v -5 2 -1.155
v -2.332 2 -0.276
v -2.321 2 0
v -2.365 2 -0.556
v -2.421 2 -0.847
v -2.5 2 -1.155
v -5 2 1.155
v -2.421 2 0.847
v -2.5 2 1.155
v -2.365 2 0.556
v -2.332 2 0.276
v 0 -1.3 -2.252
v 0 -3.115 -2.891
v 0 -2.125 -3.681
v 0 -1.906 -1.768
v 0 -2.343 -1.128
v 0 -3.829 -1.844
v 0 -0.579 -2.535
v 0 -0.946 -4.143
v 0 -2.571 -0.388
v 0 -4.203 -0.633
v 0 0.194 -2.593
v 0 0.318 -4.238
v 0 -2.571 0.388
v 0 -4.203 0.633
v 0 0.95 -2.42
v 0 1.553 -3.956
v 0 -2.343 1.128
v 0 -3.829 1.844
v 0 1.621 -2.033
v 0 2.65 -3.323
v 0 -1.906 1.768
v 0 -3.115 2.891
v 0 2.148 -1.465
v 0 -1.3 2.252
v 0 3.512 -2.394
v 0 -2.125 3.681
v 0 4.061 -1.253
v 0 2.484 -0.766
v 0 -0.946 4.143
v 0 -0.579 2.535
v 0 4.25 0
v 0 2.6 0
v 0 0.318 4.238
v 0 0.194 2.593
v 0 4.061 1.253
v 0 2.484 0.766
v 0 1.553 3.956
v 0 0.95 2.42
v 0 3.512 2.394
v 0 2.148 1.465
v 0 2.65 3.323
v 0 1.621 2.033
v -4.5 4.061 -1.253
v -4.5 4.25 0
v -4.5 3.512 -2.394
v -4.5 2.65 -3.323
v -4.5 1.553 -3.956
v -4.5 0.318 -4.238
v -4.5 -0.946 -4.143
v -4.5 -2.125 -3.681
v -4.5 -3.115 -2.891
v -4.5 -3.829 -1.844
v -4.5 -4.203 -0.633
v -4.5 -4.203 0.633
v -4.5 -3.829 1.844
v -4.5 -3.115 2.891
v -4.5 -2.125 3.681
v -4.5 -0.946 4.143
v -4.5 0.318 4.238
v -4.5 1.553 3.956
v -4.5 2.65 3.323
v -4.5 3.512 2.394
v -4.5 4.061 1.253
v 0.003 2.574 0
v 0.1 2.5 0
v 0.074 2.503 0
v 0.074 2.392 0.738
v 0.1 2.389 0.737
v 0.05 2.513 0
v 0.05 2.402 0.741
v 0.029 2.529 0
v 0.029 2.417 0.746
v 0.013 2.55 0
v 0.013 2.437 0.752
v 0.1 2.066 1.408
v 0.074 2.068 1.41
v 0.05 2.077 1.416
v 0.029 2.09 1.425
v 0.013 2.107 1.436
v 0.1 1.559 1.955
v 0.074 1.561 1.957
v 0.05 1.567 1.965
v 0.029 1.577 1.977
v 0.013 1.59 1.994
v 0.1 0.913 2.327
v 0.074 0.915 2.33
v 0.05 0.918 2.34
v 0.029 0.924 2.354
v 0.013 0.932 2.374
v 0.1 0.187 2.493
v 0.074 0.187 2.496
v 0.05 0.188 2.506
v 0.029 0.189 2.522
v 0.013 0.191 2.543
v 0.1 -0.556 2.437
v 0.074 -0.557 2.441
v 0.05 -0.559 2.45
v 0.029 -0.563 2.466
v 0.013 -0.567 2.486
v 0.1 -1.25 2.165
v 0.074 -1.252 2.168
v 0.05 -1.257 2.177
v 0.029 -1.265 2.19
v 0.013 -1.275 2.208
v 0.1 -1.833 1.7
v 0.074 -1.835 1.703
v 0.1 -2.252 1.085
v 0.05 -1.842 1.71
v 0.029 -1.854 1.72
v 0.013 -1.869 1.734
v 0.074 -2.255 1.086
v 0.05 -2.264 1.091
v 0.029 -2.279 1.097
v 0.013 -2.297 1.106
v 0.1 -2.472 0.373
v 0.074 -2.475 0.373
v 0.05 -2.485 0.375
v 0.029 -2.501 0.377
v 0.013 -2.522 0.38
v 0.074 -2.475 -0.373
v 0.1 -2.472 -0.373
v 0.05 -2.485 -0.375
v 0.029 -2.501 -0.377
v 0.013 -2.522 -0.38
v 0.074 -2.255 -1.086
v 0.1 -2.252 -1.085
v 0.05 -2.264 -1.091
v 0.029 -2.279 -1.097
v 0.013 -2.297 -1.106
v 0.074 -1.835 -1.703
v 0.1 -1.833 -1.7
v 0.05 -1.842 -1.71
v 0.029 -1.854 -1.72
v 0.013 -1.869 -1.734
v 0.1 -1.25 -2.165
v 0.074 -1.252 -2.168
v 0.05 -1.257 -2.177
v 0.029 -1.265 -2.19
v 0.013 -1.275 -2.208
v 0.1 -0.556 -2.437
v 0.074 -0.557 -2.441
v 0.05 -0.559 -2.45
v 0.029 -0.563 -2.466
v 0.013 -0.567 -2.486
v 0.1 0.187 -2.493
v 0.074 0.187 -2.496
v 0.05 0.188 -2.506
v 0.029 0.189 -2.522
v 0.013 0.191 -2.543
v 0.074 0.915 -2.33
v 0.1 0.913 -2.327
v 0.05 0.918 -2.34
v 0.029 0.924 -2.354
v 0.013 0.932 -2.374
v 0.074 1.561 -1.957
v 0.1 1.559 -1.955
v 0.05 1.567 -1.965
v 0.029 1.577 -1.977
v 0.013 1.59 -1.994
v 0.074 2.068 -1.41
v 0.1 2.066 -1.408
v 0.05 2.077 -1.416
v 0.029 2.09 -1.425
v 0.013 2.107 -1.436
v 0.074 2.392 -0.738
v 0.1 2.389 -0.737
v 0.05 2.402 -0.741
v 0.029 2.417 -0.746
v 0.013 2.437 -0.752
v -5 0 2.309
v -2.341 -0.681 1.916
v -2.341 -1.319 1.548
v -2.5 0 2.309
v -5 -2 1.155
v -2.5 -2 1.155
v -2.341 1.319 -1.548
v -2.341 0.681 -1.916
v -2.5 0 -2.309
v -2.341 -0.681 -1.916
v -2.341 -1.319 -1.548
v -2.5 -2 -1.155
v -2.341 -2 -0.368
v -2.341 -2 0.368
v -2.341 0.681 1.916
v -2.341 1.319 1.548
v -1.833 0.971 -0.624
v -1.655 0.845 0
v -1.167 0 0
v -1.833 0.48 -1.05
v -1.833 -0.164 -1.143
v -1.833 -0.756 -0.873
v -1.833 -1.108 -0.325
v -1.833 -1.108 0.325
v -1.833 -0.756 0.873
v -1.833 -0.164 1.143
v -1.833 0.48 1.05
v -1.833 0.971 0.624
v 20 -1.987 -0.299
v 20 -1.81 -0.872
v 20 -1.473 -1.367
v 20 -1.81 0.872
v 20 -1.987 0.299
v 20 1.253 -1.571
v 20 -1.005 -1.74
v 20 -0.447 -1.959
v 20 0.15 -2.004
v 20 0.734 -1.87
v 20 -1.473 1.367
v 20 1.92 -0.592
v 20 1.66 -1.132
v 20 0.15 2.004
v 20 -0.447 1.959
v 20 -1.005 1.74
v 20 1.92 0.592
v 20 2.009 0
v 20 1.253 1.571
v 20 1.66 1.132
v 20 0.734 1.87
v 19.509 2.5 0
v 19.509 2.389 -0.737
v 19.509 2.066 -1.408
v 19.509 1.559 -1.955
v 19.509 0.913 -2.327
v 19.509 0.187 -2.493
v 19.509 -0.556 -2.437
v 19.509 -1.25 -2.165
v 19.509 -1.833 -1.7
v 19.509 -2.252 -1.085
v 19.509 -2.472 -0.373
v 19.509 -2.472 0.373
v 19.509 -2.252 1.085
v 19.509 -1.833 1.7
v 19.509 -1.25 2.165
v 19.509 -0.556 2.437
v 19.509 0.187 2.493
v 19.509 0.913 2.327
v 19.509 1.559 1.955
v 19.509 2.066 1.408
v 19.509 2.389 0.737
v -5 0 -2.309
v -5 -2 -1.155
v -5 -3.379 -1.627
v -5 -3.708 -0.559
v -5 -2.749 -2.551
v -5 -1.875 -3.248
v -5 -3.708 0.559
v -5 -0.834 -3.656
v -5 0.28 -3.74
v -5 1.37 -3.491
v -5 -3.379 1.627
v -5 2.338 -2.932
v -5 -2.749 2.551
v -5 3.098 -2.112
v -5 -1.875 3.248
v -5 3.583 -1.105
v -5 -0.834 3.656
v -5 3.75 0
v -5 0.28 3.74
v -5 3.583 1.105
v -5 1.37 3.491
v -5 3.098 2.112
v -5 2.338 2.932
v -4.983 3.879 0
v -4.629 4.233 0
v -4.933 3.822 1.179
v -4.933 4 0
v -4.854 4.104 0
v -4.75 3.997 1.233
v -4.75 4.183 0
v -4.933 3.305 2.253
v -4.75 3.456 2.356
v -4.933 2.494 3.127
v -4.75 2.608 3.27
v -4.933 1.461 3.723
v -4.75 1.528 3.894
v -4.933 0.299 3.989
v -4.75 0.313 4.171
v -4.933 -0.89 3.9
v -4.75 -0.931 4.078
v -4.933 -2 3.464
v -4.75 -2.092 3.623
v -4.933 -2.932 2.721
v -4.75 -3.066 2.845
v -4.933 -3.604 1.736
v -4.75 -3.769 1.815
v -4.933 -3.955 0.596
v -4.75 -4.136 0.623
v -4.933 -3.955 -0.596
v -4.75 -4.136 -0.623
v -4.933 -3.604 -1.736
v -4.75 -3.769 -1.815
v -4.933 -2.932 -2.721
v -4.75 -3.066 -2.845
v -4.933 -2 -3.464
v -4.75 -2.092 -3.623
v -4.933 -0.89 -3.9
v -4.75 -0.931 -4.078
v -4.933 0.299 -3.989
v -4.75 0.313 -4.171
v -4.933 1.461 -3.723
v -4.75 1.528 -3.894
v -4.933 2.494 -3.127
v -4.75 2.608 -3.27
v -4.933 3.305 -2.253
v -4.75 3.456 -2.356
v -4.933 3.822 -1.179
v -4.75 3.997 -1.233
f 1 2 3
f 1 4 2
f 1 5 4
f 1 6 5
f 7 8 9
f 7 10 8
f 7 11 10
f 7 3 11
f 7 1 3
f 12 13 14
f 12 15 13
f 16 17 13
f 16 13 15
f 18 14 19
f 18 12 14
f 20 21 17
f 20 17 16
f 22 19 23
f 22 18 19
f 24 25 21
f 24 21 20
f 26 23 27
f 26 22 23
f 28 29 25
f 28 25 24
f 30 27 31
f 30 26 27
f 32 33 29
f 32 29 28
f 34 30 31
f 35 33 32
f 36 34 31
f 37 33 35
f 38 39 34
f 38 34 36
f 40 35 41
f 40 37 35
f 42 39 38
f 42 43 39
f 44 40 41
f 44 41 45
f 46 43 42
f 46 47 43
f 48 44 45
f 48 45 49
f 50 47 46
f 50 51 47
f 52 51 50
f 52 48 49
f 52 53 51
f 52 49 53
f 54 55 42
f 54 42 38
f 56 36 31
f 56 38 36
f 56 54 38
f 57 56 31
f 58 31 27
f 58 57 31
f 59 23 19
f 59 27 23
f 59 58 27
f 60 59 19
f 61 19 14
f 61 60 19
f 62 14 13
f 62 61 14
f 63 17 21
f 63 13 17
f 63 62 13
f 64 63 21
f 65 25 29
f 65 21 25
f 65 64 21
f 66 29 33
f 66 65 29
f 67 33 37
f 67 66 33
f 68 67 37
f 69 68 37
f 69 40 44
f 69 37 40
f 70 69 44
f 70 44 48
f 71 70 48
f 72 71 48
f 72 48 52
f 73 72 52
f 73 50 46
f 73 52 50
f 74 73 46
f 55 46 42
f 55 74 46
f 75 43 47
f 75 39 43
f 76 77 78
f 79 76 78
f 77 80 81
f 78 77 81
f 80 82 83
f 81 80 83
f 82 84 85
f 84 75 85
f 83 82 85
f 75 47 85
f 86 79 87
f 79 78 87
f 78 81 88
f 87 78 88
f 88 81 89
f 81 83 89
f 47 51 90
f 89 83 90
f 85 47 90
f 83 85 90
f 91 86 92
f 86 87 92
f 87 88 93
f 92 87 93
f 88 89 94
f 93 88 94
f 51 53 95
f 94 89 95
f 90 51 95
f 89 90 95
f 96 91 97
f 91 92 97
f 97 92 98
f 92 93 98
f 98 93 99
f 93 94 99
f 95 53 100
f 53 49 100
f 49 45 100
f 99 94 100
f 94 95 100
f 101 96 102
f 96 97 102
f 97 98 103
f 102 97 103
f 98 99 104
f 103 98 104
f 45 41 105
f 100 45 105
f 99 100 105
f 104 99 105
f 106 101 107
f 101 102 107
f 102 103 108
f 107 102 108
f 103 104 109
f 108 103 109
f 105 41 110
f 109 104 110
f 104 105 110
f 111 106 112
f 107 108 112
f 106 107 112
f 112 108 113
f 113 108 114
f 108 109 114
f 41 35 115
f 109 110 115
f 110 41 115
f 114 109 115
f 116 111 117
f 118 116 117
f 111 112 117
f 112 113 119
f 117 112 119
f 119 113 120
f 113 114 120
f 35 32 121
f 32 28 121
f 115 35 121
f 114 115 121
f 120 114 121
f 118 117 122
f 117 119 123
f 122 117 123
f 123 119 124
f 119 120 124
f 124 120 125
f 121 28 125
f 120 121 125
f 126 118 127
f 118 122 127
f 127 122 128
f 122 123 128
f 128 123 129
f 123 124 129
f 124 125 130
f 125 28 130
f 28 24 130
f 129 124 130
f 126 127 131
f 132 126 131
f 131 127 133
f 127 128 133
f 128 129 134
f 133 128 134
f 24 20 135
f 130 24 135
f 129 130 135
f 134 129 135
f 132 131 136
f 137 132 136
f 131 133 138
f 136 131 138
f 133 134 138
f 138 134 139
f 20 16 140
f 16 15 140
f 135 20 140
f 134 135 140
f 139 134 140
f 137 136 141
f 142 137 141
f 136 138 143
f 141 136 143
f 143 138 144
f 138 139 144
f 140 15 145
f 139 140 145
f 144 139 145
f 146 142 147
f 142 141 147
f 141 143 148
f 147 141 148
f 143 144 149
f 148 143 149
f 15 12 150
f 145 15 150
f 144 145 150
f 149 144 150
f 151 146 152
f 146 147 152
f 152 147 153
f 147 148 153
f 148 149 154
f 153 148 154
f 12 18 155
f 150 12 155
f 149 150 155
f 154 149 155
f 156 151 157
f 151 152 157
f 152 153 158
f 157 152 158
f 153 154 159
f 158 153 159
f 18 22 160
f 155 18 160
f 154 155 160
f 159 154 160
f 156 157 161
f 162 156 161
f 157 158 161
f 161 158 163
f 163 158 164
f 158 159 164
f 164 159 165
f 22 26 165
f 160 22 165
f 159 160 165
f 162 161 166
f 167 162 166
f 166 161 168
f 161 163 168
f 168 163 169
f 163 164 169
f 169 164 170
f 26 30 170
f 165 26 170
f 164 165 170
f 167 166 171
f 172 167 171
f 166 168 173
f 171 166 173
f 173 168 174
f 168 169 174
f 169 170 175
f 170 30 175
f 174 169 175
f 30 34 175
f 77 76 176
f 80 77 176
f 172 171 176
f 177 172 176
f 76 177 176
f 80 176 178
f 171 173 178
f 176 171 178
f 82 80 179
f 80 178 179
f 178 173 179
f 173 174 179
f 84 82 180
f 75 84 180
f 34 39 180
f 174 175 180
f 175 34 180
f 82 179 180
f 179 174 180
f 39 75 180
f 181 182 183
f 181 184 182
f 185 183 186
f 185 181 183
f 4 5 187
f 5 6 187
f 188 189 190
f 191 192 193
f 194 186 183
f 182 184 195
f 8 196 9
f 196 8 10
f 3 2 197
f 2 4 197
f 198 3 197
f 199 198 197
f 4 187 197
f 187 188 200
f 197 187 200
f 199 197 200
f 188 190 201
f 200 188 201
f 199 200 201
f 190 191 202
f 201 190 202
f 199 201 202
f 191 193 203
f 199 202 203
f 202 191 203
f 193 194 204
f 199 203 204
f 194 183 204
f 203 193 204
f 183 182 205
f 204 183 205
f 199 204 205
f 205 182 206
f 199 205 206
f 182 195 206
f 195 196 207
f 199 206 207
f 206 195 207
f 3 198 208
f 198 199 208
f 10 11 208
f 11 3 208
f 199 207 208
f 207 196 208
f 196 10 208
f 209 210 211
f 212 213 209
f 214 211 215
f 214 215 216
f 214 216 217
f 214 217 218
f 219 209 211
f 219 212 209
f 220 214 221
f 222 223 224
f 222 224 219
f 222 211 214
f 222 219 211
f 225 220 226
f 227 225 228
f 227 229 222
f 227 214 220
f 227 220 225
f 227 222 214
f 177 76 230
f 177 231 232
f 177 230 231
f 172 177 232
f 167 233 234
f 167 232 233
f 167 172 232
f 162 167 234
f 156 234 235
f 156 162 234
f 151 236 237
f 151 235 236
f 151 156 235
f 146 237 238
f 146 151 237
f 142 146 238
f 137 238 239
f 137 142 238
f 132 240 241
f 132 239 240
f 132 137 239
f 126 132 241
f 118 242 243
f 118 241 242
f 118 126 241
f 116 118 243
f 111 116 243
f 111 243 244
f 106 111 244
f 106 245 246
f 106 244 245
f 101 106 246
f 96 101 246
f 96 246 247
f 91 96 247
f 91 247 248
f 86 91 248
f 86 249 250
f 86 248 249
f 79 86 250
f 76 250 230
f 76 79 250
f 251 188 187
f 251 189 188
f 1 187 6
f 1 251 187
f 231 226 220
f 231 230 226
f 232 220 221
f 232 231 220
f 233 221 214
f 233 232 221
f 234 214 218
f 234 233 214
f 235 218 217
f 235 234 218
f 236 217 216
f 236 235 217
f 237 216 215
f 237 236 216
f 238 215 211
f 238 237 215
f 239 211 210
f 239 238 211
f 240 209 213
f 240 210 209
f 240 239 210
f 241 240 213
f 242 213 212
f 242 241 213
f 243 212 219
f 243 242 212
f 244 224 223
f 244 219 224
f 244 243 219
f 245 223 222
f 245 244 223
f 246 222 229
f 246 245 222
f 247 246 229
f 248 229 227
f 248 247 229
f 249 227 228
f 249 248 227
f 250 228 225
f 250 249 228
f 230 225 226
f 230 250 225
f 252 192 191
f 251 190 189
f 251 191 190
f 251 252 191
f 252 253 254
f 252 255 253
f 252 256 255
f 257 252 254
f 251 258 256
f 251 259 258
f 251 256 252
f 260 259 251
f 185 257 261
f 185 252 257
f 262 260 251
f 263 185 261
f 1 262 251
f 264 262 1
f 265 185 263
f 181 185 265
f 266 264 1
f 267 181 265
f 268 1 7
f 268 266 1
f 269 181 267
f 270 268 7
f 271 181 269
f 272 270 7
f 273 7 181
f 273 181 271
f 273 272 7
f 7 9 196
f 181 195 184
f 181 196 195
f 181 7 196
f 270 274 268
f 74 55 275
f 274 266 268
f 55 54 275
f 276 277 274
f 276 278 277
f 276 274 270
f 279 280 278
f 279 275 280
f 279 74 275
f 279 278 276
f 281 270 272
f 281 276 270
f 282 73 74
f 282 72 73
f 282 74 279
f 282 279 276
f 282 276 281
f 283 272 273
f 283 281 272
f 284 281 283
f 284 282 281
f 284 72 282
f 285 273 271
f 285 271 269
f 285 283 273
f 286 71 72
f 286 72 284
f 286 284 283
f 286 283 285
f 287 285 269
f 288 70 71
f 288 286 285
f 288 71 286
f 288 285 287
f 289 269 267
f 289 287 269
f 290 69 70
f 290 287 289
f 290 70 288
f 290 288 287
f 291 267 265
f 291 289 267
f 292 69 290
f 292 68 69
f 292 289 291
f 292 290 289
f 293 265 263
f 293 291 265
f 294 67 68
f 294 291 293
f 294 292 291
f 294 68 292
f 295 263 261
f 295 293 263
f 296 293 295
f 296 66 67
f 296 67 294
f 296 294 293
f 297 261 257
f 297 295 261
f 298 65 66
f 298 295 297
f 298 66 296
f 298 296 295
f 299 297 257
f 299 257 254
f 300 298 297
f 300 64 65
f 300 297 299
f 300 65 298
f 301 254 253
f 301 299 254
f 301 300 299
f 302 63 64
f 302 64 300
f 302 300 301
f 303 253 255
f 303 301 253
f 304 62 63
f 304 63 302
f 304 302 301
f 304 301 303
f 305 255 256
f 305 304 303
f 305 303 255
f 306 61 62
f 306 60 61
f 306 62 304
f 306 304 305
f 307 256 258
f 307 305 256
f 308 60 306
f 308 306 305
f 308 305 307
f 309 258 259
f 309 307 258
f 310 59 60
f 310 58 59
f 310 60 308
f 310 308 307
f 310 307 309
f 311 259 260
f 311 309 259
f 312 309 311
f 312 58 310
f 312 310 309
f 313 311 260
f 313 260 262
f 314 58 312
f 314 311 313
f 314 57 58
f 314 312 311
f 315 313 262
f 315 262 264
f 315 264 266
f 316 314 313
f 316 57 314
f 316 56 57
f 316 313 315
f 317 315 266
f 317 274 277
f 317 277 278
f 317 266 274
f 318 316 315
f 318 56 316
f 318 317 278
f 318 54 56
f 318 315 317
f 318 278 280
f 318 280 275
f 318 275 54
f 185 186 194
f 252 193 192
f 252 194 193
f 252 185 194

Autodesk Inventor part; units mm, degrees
ref_plane "YZ Plane" through (0, 0, 0) normal (1, 0, 0) x (0, 1, 0)
ref_plane "XZ Plane" through (0, 0, 0) normal (0, 1, 0) x (-1, 0, 0)
sketch "Szkic1" plane through (0, 0, 0) normal (0, 0, 1) x (1, 0, 0)
  line L0 (-1.1667, 0) -> (20, 0)
  line L1 (20, 0) -> (20, 2.5)
  line L2 (20, 2.5) -> (4, 2.5)
  line L3 (4, 2.5) -> (3.5091, 2.5)
  line L4 (3.5091, 2.5) -> (0, 2.5)
  line L5 (0, 2.5) -> (0, 4.25)
  line L6 (0, 4.25) -> (-5, 4.25)
  line L7 (-5, 4.25) -> (-5, 2.3094)
  line L8 (-5, 2.3094) -> (-2.5, 2.3094)
  line L9 (-2.5, 2.3094) -> (-1.1667, 0)
  line L10 (-10, 0) -> (25, 0) projected
  line L11 (0, -0.85) -> (0, 5.1) projected
  line L12 (4, 2.5) -> (0, 2.5) construction
  dimension "d1" = 16
  dimension "d2" = 0.4909
  dimension "d3" = 5
  dimension "d4" = 2.5
  dimension "d5" = 60
  dimension "d6" = 5
  dimension "d7" = 5
  dimension "d8" = 4.6188
  dimension "d9" = 8.5
  dimension "d26" = 20
revolve "Bryła" add sketch "Szkic1" angle 360 about axis through (-1.1667, 0, 0) along (1, 0, 0)
sketch "Szkic2" plane through (-5, 0, 0) normal (-1, 0, 0) x (0, 0, 1)
  circle A0 centre (0, 0) radius 2.3094 projected
  line L0 (0, -5.95) -> (0, 5.95) projected
  line L1 (-5.95, 0) -> (5.95, 0) projected
  line L2 (2.3094, 0) -> (1.1547, -2)
  line L3 (1.1547, -2) -> (-1.1547, -2)
  line L4 (-1.1547, -2) -> (-2.3094, 0)
  line L5 (-2.3094, 0) -> (-1.1547, 2)
  line L6 (-1.1547, 2) -> (1.1547, 2)
  line L7 (1.1547, 2) -> (2.3094, 0)
extrude "Szczelina" add sketch "Szkic2" against normal up to next contours L7 A0 | A0 L2 | L6 L0 A0 | A0 L0 L3 | L0 L6 A0 | A0 L3 L0 | L4 A0 | A0 L5
fillet "Zaokrąglenie1" radius 0.5 1 edges at (-5, -4.25, 0)
thread "Gwint" size "M5x0.8" class "6g" standard "ISO Metric profile" length 16
chamfer "Faza1" distance 0.4908 distance2 0.4908 1 edges at (20, -2.5, 0) measured on face at (20, -0.7379, -0.3873)
ref_plane "Work Plane1" through (29, 0, 0) normal (0, -1, 0) x (1, 0, 0)
fillet "Fillet2" radius 0.1 1 edges at (0, -2.5, 0)
equation "\"d1\" = GEL"
equation "\"d3\" = KOH"
equation "\"d4\" = INTI"
equation "\"d6\" = GD"
equation "\"d7\" = BDM"
equation "\"d8\" = 1.1547 * SW"
equation "\"d9\" = KOD"
equation "\"d26\" = NLG"
equation "\"d30\" = R"
equation "\"d17\" = RR"
equation "\"d13\" = GEL"
equation "\"d15\" = -0.5 * SPD + 0.5 * GD"
equation "\"d16\" = GUL"
equation "\"GD\" = NND"
equation "\"NLG\" = 20"
equation "\"GEL\" = 16"
equation "\"KOD\" = 8.5"
equation "\"KOH\" = NND"
equation "\"INTI\" = 2.5"
equation "\"GAL\" = 0.61345 * PTC"
equation "\"GUL\" = 0.61345 * PTC"
equation "\"BDM\" = NND"
equation "\"SW\" = 4"
equation "\"RR\" = 0.1 * NND"
equation "\"SPD\" = NND - 1.2269 * PTC"
equation "\"R\" = 0.1"
equation "\"PHH\" = 0.13"
equation "\"GD1\" = THREADDIA - 1.2269 * PTC"
equation "\"THREADDIA\" = 5"
equation "\"FAWI\" = 45deg"
equation "\"PTC\" = 0.8"
equation "\"KOH1\" = 4.5"
equation "\"NND\" = 5"
equation "\"TOA\" = 30deg"
equation "\"E0\" = 1.155 * SW"
properties part number "AS 1420 - 1973 - M5 x 20" material "Stal, miękka"
